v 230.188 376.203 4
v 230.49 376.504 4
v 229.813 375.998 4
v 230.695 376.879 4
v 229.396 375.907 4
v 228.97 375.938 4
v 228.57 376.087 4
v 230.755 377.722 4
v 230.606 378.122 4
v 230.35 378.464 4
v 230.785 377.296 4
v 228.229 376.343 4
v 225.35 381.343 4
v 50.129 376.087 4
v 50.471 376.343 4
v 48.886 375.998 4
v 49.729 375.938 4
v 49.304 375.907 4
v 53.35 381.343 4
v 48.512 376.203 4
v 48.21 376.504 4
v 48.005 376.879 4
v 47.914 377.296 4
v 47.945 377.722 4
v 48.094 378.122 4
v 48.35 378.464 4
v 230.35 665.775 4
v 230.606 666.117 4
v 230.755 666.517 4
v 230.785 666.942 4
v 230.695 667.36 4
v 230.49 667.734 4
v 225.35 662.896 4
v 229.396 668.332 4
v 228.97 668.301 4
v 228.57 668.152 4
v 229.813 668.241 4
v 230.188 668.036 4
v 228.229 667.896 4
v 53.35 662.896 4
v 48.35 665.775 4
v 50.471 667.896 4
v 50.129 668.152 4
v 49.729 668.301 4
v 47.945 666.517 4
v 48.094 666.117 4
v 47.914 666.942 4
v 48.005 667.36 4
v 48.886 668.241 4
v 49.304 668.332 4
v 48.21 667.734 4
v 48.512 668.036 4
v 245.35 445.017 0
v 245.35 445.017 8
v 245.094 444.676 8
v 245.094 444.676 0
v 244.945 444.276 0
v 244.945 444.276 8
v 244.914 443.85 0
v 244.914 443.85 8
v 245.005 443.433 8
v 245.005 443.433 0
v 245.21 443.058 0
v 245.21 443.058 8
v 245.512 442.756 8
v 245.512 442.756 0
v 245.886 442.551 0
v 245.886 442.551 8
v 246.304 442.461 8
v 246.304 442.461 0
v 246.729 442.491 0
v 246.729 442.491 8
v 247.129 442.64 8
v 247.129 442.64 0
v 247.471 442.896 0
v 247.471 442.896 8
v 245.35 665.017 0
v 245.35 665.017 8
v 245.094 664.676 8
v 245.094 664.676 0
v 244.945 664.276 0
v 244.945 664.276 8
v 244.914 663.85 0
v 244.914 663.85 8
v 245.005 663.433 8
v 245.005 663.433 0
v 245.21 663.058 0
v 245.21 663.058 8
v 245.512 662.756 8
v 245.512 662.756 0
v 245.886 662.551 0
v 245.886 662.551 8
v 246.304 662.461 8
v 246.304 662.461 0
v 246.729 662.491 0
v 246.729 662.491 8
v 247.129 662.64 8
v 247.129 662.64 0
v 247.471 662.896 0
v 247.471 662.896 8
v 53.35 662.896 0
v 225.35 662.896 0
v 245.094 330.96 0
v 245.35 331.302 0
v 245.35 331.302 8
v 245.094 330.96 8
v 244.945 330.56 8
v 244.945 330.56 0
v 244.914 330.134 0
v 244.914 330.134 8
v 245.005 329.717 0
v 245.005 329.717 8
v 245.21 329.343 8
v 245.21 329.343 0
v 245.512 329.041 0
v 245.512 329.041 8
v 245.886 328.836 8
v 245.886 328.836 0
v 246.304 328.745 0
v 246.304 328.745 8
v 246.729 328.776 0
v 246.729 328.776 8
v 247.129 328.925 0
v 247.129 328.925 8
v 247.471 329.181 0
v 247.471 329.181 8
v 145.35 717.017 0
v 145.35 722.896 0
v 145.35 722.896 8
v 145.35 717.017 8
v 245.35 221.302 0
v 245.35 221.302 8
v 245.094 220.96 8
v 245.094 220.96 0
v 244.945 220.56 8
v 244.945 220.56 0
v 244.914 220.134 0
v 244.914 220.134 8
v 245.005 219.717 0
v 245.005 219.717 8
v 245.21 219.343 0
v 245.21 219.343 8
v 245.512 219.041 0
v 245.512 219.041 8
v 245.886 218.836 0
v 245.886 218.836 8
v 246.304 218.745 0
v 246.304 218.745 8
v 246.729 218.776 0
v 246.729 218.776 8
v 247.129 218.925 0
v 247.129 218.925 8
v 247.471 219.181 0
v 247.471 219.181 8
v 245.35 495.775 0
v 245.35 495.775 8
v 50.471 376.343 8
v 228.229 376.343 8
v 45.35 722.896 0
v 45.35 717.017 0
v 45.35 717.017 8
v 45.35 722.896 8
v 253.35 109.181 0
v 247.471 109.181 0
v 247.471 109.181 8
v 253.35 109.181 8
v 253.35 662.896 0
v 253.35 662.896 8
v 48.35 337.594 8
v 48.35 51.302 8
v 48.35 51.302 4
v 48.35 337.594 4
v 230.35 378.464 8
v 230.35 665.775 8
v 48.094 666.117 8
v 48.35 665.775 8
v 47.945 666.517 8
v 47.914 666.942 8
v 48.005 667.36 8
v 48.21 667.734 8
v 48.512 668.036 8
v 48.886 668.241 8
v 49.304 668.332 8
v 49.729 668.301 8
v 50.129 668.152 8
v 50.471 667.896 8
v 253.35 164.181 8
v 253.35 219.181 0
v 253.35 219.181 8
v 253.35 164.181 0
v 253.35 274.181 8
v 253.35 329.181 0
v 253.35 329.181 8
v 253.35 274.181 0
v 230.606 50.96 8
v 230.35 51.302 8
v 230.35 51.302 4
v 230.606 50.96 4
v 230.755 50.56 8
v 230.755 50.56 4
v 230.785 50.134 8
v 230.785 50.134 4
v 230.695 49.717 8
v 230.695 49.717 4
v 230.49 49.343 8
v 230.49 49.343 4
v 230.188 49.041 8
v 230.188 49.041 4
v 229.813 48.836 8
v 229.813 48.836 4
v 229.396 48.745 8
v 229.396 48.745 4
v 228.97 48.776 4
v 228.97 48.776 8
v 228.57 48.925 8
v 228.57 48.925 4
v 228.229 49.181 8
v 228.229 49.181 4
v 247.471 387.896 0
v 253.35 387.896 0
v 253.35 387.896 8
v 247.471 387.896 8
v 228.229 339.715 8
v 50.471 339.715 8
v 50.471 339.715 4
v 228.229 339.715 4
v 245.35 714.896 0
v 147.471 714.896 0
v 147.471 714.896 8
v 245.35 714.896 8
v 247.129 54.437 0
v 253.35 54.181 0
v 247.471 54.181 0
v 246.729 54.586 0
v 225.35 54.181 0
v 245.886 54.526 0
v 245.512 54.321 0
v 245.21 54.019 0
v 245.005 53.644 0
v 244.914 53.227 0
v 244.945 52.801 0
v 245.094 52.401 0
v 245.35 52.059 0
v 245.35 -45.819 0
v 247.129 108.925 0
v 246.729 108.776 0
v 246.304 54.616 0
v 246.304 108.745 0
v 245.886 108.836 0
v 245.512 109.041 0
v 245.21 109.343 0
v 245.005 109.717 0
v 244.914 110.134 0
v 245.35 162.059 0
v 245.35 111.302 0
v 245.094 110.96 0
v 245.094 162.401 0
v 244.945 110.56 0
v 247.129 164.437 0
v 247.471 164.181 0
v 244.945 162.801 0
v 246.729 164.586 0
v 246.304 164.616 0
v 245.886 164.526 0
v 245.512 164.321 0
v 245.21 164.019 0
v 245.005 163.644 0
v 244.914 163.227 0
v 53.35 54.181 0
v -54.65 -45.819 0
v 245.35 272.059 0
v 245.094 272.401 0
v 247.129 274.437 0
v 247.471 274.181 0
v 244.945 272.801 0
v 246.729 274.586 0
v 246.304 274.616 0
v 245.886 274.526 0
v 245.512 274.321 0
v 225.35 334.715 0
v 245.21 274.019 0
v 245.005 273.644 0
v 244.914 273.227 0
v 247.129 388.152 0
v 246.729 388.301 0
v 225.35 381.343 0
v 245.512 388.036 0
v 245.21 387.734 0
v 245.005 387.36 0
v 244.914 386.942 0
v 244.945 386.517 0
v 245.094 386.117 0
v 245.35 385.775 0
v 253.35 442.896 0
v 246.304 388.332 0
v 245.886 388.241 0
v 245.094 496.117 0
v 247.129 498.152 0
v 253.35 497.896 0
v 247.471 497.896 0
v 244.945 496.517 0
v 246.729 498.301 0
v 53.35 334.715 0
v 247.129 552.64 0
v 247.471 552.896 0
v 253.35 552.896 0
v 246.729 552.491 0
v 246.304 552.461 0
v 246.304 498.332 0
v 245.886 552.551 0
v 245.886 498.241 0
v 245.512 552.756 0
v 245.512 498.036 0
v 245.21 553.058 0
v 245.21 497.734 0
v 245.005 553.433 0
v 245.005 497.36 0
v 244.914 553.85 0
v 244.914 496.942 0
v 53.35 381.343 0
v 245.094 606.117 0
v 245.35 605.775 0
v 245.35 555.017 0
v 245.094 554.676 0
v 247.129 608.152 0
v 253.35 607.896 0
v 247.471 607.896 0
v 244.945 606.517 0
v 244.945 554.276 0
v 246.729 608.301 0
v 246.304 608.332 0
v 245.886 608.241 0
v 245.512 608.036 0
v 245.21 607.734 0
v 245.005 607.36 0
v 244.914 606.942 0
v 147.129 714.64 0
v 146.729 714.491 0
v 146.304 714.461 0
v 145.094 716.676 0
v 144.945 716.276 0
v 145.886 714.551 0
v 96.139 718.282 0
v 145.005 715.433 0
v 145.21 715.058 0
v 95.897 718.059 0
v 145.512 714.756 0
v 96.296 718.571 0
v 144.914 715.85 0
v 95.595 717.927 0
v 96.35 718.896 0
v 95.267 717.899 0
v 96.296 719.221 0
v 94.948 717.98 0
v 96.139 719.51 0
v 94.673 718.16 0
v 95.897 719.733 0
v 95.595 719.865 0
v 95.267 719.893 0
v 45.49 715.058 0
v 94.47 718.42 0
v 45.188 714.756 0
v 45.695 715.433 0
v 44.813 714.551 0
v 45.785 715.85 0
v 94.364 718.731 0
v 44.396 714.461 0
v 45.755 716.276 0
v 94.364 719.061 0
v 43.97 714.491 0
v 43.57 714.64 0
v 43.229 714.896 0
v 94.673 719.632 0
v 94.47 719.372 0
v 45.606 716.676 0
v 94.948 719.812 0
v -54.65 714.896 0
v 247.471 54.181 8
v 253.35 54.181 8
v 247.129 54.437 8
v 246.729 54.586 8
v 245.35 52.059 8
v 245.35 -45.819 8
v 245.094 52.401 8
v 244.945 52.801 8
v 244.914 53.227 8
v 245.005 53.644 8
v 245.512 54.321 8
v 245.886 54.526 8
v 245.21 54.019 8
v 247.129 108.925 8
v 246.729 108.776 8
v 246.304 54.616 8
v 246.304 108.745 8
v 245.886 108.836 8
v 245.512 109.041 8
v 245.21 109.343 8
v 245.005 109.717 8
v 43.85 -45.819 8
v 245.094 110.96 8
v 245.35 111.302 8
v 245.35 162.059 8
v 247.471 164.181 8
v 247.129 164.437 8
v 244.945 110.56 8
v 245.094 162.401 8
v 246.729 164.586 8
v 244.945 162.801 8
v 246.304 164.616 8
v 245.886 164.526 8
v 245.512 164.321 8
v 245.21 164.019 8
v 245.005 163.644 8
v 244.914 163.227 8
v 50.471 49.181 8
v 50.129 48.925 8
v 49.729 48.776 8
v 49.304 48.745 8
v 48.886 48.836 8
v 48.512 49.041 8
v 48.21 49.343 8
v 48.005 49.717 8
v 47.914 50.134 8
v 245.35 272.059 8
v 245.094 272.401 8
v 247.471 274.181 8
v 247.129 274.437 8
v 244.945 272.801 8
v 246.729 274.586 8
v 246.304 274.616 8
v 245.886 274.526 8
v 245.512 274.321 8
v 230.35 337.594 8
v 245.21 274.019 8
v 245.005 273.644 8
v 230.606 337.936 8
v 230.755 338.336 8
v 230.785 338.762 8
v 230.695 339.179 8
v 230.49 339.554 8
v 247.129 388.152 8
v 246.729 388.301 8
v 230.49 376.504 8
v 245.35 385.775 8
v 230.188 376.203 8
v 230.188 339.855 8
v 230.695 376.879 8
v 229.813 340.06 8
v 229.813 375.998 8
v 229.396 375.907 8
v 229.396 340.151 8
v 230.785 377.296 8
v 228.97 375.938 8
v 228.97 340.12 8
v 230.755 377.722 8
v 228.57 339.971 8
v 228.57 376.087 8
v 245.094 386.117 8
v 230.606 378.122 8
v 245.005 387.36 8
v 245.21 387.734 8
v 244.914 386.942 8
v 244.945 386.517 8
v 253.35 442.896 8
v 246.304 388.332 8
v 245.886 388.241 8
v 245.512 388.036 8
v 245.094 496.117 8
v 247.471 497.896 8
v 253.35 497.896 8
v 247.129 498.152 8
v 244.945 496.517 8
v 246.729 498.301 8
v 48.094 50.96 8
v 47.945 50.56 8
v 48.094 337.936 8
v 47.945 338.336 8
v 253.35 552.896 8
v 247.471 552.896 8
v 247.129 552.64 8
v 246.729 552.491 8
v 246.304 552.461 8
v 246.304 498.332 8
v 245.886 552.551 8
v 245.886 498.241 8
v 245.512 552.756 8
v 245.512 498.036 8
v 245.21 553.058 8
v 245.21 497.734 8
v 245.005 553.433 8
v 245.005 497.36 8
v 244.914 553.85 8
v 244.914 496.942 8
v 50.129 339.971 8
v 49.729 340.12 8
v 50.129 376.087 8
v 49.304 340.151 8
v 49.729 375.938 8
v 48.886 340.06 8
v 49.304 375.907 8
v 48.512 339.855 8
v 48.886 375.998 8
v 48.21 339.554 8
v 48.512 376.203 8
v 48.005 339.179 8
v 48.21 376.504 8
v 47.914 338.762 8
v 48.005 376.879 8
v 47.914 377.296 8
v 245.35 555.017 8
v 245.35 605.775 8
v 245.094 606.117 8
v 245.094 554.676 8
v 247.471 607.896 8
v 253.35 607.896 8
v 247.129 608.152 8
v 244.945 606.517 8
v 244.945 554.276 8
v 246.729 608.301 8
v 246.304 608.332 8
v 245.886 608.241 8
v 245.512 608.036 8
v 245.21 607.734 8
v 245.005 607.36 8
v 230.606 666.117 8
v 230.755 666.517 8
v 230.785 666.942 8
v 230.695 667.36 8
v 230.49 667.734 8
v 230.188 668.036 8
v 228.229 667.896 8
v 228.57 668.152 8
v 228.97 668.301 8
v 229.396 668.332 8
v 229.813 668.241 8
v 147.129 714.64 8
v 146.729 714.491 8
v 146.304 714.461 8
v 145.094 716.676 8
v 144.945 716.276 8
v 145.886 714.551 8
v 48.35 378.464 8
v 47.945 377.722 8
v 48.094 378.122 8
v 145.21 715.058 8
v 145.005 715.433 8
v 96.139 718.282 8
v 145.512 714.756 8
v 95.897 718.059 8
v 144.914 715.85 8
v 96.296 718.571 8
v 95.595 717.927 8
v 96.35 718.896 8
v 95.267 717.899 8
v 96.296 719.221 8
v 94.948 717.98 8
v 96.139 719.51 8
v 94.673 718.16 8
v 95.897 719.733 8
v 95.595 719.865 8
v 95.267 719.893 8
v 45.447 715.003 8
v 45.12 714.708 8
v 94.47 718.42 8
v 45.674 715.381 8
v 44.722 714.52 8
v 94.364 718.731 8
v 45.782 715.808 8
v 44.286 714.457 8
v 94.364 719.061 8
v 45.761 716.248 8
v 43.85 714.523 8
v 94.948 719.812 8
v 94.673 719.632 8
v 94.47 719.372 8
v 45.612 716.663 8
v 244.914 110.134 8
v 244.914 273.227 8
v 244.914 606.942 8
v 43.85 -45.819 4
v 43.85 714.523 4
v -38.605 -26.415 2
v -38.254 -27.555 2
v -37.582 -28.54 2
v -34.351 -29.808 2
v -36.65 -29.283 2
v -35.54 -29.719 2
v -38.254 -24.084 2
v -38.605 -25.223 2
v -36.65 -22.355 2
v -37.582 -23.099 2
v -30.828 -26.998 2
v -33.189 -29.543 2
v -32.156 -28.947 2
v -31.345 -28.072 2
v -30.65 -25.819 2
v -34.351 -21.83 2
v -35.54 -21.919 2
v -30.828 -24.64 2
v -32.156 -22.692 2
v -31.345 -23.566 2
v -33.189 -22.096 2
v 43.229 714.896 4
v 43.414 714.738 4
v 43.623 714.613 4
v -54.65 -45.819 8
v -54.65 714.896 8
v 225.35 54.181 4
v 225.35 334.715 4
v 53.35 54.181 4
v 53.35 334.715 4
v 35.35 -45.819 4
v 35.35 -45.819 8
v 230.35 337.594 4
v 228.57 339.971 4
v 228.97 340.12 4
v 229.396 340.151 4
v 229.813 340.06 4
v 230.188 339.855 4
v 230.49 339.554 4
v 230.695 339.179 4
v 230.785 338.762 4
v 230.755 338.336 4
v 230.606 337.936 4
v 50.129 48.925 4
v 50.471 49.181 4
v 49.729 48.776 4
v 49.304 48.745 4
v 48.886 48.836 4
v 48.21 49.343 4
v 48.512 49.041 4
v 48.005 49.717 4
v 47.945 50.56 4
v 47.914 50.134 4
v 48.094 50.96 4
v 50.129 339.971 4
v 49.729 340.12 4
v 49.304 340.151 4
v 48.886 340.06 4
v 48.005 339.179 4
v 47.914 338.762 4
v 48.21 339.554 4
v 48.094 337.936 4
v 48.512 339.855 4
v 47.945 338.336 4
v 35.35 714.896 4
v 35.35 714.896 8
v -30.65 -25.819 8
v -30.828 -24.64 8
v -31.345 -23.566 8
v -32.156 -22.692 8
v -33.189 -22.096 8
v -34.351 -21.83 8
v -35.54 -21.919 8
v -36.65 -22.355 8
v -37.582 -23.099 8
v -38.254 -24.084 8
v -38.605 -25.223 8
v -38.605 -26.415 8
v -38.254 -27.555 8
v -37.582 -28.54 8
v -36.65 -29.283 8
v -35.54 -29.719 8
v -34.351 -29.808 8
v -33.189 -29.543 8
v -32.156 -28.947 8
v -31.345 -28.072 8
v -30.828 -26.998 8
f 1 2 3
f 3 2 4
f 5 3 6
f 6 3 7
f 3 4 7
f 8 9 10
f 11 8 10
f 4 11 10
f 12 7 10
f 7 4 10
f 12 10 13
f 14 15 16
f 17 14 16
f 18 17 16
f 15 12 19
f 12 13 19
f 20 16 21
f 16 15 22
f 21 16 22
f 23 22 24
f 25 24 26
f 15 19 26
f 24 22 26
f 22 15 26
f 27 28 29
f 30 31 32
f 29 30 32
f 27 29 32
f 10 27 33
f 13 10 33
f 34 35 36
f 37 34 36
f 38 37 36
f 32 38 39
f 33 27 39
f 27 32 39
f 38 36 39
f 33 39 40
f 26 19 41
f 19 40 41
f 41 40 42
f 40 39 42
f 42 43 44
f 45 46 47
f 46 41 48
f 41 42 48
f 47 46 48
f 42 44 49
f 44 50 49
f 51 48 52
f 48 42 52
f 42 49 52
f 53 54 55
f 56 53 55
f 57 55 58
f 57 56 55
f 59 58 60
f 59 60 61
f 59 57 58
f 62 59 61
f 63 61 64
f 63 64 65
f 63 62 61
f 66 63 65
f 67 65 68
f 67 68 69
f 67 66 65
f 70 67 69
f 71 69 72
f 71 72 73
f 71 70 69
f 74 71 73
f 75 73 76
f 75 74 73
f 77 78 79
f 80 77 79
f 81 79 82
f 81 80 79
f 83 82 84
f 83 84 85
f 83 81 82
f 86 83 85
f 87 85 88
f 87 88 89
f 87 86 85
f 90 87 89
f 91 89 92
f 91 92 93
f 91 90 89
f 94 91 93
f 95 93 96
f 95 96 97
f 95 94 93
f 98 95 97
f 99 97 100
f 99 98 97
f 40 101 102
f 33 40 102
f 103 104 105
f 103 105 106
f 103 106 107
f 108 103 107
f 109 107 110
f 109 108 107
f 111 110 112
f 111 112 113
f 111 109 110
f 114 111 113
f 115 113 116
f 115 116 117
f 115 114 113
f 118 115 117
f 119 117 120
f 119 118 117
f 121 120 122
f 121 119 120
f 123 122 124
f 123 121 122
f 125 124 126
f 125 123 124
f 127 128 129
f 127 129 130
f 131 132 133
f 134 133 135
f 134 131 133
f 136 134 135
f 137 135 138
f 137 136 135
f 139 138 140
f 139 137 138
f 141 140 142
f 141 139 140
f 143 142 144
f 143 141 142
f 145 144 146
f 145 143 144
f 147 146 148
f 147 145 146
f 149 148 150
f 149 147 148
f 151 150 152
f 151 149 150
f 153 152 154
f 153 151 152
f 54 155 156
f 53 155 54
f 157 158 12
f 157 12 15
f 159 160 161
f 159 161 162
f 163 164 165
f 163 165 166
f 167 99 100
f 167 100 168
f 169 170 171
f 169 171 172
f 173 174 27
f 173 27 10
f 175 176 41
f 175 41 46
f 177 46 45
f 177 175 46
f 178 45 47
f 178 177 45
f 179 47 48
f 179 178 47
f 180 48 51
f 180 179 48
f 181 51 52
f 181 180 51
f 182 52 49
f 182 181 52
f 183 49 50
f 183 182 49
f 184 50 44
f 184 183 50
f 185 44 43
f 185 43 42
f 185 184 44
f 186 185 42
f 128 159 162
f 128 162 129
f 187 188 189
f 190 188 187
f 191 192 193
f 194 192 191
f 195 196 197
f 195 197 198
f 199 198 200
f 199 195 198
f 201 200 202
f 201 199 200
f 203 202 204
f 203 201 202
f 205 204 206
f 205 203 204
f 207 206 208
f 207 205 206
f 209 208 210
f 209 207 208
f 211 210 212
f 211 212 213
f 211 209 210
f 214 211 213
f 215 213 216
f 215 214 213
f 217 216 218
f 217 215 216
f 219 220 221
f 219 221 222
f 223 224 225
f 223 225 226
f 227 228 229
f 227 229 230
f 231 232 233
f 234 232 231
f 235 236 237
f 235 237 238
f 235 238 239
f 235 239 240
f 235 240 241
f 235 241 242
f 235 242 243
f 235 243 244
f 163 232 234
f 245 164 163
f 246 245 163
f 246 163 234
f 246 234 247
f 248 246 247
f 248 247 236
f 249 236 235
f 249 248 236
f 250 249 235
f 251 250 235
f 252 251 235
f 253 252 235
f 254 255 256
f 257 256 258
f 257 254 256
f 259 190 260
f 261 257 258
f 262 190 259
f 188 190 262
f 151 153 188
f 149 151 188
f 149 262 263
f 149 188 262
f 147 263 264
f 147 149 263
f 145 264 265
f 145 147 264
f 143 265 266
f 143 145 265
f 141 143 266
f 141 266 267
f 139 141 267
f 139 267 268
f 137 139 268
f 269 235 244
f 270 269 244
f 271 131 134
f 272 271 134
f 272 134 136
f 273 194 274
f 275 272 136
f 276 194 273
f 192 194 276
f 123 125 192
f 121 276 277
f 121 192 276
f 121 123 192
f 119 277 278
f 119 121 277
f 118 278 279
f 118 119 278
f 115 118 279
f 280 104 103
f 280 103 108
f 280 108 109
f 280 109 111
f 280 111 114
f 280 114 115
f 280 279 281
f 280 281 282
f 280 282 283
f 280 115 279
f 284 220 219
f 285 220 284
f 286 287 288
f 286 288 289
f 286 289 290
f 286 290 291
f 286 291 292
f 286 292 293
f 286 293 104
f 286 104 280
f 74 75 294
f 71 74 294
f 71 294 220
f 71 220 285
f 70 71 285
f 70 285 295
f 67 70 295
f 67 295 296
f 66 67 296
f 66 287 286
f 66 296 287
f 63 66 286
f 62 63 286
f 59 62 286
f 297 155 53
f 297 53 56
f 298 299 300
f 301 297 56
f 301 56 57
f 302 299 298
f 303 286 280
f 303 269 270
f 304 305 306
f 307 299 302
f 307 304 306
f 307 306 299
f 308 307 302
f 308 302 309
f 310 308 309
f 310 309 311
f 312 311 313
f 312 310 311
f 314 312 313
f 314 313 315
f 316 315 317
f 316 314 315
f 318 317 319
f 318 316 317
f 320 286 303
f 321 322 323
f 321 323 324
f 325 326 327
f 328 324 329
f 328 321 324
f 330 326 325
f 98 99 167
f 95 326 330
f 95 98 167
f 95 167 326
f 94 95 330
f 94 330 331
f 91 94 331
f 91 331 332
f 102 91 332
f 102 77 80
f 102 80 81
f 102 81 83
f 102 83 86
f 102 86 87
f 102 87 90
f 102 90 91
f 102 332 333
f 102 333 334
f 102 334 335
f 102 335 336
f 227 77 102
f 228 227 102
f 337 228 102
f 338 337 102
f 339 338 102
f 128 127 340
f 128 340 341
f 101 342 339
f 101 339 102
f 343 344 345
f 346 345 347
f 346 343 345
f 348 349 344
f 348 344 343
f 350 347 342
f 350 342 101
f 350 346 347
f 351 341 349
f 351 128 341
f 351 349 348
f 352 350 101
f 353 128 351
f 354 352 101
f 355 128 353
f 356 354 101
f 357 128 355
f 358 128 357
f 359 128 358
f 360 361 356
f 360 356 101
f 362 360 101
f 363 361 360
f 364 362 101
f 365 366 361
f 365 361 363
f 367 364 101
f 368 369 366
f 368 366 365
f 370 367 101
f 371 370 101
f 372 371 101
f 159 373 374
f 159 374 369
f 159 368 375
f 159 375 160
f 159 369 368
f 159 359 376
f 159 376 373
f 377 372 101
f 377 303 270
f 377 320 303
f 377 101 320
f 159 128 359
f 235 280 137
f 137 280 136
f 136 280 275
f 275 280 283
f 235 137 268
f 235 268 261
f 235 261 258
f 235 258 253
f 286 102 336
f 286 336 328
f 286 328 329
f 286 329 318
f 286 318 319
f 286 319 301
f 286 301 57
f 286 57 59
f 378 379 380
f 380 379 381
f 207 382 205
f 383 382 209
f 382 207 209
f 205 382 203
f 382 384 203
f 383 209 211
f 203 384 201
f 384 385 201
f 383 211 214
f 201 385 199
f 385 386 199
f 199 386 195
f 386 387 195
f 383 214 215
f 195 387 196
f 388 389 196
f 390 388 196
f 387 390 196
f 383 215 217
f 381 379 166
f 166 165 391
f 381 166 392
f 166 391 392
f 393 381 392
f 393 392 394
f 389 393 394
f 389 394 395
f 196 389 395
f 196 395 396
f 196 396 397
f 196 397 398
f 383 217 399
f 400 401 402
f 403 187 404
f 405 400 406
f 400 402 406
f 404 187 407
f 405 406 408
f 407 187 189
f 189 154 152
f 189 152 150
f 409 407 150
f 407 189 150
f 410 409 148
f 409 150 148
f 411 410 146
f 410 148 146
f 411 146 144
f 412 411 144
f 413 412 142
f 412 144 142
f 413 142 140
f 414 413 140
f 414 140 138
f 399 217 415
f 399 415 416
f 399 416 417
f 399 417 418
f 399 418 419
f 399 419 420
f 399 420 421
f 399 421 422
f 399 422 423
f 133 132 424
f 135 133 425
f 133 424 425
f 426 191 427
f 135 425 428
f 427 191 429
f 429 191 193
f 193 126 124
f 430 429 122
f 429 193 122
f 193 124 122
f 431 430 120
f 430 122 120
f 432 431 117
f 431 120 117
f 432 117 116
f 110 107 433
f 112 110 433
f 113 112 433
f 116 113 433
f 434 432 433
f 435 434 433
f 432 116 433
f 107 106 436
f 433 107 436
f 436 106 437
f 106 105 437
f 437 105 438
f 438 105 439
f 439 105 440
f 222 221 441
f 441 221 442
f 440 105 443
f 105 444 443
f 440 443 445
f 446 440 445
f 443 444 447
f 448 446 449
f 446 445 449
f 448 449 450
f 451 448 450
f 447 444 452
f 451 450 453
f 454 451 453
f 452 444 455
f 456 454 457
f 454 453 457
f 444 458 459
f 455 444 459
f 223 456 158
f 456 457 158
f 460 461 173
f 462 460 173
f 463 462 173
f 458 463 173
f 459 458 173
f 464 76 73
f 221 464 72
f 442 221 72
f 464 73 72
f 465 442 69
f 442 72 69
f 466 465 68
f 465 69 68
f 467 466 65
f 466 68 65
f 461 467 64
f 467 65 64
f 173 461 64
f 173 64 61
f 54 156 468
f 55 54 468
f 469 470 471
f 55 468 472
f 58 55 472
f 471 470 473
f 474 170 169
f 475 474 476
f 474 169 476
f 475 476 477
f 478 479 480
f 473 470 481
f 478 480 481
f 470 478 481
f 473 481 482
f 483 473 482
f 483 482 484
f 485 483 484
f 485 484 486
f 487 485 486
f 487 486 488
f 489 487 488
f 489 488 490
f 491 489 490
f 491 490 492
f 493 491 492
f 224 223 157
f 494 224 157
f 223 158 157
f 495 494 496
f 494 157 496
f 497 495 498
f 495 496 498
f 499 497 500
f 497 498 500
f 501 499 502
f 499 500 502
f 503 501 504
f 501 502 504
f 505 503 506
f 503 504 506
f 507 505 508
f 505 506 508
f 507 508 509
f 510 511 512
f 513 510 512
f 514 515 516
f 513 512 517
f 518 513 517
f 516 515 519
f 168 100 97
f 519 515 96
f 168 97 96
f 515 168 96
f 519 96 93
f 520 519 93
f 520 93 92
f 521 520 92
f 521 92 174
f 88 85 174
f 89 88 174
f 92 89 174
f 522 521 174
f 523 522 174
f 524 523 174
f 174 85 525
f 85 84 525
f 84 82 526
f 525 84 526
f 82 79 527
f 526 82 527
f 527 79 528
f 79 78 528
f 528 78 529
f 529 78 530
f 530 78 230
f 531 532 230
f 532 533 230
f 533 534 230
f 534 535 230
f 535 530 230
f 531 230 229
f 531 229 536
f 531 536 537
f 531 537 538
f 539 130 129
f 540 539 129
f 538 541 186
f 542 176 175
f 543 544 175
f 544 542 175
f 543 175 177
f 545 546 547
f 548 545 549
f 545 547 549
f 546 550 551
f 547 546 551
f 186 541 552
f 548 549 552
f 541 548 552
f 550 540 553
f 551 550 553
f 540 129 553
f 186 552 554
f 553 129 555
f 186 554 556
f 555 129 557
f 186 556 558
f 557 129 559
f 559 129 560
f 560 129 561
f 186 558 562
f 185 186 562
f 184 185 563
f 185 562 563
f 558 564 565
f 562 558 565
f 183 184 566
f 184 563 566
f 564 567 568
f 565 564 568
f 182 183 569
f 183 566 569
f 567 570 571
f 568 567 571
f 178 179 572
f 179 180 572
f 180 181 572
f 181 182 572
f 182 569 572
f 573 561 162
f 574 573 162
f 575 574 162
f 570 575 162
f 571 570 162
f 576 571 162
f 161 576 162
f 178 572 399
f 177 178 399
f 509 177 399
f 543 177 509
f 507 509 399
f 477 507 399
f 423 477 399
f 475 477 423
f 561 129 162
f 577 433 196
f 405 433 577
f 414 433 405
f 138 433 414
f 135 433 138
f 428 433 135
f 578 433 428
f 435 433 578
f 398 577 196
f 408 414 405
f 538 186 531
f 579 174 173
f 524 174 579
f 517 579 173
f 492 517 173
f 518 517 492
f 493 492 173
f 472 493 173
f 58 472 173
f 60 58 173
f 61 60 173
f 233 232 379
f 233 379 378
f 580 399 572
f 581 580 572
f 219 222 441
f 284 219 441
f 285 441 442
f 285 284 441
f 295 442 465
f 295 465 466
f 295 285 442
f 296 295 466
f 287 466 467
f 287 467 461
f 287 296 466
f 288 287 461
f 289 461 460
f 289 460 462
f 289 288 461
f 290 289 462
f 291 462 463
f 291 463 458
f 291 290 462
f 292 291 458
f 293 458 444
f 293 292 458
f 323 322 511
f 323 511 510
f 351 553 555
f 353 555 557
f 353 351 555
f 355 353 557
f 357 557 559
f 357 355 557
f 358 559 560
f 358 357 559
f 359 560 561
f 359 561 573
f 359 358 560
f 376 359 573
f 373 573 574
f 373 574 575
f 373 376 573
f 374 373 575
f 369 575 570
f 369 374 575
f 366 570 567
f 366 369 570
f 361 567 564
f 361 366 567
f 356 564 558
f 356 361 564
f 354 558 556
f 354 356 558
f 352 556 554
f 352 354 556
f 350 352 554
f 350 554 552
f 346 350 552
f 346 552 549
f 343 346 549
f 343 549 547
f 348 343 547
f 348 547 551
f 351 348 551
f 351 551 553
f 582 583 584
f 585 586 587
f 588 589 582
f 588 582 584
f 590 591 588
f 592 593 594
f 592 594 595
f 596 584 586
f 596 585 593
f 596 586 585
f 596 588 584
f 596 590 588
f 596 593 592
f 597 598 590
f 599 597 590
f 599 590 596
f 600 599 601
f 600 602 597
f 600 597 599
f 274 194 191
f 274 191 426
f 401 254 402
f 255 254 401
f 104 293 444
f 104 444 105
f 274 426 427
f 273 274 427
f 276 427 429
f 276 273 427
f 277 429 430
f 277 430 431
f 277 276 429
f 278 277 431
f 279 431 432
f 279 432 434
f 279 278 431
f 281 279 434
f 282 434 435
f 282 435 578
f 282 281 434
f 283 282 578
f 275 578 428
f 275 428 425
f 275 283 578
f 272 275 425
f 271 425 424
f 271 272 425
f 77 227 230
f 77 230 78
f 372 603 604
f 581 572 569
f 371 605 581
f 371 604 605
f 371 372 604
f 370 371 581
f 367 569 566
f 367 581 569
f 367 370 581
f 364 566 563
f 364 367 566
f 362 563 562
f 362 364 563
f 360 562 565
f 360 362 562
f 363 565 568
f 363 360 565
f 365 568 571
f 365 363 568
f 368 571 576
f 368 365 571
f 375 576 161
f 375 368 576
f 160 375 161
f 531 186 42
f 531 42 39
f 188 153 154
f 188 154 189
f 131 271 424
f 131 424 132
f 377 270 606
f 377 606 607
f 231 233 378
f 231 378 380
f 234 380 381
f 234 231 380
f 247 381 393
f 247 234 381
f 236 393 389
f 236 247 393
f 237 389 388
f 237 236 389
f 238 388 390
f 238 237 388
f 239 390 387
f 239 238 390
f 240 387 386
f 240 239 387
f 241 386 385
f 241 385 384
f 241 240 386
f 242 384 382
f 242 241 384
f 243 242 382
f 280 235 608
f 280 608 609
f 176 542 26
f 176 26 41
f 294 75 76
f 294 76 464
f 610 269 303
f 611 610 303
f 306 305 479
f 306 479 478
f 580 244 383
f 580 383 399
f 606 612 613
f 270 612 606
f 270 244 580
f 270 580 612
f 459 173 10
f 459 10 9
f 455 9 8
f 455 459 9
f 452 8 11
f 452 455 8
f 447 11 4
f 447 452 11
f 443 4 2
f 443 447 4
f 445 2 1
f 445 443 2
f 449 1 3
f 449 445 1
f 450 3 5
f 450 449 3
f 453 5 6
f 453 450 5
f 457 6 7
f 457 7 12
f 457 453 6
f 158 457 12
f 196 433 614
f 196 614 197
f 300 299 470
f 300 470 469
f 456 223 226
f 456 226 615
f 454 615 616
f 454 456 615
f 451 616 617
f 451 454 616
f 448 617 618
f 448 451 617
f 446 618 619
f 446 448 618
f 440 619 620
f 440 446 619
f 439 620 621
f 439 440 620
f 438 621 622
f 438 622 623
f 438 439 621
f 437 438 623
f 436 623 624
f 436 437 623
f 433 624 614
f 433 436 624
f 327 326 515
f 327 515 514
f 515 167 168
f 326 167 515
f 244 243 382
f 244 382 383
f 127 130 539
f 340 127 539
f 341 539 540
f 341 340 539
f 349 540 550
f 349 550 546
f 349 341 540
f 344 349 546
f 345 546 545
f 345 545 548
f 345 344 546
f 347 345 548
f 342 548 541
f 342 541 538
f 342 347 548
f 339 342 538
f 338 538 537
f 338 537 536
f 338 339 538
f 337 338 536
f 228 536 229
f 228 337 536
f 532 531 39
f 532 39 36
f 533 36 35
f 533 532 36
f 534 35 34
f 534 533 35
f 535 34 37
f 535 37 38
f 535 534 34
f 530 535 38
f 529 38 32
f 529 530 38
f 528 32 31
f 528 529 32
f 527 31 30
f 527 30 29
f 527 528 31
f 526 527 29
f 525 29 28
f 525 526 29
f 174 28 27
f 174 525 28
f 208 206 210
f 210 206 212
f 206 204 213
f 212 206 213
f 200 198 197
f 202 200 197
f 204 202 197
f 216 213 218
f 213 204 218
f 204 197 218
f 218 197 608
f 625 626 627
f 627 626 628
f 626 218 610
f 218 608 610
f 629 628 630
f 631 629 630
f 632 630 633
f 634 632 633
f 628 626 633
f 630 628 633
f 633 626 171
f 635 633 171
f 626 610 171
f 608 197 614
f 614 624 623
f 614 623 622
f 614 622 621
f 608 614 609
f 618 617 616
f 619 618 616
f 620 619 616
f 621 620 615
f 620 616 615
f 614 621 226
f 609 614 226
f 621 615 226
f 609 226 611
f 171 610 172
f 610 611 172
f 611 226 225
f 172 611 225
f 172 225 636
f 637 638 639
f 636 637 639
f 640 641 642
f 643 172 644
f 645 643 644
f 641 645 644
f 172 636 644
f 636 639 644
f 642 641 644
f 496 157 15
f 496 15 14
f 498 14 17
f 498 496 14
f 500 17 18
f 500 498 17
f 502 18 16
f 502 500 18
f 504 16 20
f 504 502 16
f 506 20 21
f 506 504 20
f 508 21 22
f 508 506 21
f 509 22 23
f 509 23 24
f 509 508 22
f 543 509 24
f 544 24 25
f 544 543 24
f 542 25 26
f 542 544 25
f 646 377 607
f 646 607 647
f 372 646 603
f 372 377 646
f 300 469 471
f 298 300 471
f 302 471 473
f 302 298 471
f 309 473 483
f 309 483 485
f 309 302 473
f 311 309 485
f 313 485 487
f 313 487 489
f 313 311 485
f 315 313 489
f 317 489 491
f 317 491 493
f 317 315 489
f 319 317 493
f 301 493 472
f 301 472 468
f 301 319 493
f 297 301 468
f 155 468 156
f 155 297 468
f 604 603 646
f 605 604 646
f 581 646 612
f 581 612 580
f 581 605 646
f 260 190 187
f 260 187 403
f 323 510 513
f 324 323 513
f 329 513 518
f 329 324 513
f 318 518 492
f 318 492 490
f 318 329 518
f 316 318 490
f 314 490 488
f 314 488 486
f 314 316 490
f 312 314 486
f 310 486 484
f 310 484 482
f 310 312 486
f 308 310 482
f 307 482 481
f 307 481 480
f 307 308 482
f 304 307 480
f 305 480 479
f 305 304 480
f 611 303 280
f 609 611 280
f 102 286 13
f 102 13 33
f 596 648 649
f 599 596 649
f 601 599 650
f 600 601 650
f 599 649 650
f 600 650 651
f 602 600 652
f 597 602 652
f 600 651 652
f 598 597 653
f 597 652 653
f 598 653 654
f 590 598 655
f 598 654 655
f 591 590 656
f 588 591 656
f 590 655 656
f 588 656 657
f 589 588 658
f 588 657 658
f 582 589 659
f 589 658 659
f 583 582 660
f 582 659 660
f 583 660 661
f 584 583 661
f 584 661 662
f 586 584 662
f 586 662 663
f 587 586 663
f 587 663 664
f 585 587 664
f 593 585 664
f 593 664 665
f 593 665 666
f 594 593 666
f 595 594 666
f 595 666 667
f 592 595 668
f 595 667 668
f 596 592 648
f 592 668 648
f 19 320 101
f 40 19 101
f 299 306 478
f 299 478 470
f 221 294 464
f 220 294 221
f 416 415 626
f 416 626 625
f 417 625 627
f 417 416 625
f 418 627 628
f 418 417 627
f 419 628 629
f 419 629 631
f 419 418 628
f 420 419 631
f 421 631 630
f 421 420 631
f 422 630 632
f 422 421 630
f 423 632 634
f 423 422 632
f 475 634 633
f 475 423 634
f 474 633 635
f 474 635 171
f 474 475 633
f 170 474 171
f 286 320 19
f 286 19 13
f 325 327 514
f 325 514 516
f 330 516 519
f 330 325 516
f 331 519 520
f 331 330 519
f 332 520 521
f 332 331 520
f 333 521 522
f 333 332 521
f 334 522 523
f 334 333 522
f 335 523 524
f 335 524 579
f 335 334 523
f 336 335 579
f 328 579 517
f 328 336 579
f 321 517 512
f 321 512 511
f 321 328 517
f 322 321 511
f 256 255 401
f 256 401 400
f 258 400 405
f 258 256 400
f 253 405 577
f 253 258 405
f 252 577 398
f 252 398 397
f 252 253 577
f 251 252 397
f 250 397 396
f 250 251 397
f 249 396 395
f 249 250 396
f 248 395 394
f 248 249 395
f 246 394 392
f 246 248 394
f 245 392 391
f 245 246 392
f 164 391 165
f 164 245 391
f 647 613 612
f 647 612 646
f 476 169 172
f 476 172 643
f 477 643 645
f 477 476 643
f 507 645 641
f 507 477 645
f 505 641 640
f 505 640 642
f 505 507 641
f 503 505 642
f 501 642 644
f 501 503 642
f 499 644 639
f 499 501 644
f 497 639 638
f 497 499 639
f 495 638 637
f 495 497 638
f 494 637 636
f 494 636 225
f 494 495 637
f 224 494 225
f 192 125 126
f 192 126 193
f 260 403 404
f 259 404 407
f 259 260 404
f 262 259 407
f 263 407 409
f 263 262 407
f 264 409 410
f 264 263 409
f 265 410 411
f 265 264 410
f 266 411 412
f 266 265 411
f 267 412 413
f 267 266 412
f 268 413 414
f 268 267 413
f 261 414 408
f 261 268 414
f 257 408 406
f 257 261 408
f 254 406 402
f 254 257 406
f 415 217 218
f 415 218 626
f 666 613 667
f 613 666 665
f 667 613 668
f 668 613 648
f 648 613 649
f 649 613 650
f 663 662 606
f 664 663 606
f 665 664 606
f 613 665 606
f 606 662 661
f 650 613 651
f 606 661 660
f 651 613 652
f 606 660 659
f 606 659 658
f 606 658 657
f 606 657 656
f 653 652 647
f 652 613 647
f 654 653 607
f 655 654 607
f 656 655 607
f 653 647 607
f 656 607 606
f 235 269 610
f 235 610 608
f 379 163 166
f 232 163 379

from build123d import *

# Parameters (mm, degrees)
ESQUISSE1_R             = 1
ESQUISSE1_W             = 172
ESQUISSE1_H             = 281.553390594
ESQUISSE1_H_2           = 280.534461641
BOSS_EXTRU_1_DEPTH      = 8
ENL_V_MAT_EXTRU_1_DEPTH = 4
ESQUISSE3_W             = 8.5
ESQUISSE3_H             = 760.715269233
ENL_V_MAT_EXTRU_2_DEPTH = 4
ESQUISSE4_R             = 4
ENL_V_MAT_EXTRU_3_DEPTH = 6


with BuildPart() as part:
    # Esquisse1 → Boss.-Extru.1 (new body)
    with BuildSketch(Plane.XY):
        with BuildLine():
            Line((-54.650090097, -45.819197646), (-54.650090097, 358.028972494))
            Line((-54.650090097, 358.028972494), (-54.650090097, 714.896071587))
            Line((-54.650090097, 714.896071587), (43.228589559, 714.896071587))
            ThreePointArc((43.228589559, 714.896071587), (45.349909903, 714.896071587), (45.349909903, 717.01739193))
            Line((45.349909903, 717.01739193), (45.349909903, 722.896071587))
            Line((45.349909903, 722.896071587), (145.349909903, 722.896071587))
            Line((145.349909903, 722.896071587), (145.349909903, 717.01739193))
            ThreePointArc((145.349909903, 717.01739193), (145.349909903, 714.896071587), (147.471230246, 714.896071587))
            Line((147.471230246, 714.896071587), (245.349909903, 714.896071587))
            Line((245.349909903, 714.896071587), (245.349909903, 665.01739193))
            ThreePointArc((245.349909903, 665.01739193), (245.349909903, 662.896071587), (247.471230246, 662.896071587))
            Line((247.471230246, 662.896071587), (253.349909903, 662.896071587))
            Line((253.349909903, 662.896071587), (253.349909903, 607.896071587))
            Line((253.349909903, 607.896071587), (247.471230246, 607.896071587))
            ThreePointArc((247.471230246, 607.896071587), (245.349909903, 607.896071587), (245.349909903, 605.774751243))
            Line((245.349909903, 605.774751243), (245.349909903, 555.01739193))
            ThreePointArc((245.349909903, 555.01739193), (245.349909903, 552.896071587), (247.471230246, 552.896071587))
            Line((247.471230246, 552.896071587), (253.349909903, 552.896071587))
            Line((253.349909903, 552.896071587), (253.349909903, 497.896071587))
            Line((253.349909903, 497.896071587), (247.471230246, 497.896071587))
            ThreePointArc((247.471230246, 497.896071587), (245.349909903, 497.896071587), (245.349909903, 495.774751243))
            Line((245.349909903, 495.774751243), (245.349909903, 445.01739193))
            ThreePointArc((245.349909903, 445.01739193), (245.349909903, 442.896071587), (247.471230246, 442.896071587))
            Line((247.471230246, 442.896071587), (253.349909903, 442.896071587))
            Line((253.349909903, 442.896071587), (253.349909903, 387.896071587))
            Line((253.349909903, 387.896071587), (247.471230246, 387.896071587))
            ThreePointArc((247.471230246, 387.896071587), (245.349909903, 387.896071587), (245.349909903, 385.774751243))
            Line((245.349909903, 385.774751243), (245.349909903, 331.302122698))
            ThreePointArc((245.349909903, 331.302122698), (245.349909903, 329.180802354), (247.471230246, 329.180802354))
            Line((247.471230246, 329.180802354), (253.349909903, 329.180802354))
            Line((253.349909903, 329.180802354), (253.349909903, 274.180802354))
            Line((253.349909903, 274.180802354), (247.471230246, 274.180802354))
            ThreePointArc((247.471230246, 274.180802354), (245.349909903, 274.180802354), (245.349909903, 272.059482011))
            Line((245.349909903, 272.059482011), (245.349909903, 221.302122698))
            ThreePointArc((245.349909903, 221.302122698), (245.349909903, 219.180802354), (247.471230246, 219.180802354))
            Line((247.471230246, 219.180802354), (253.349909903, 219.180802354))
            Line((253.349909903, 219.180802354), (253.349909903, 164.180802354))
            Line((253.349909903, 164.180802354), (247.471230246, 164.180802354))
            ThreePointArc((247.471230246, 164.180802354), (245.349909903, 164.180802354), (245.349909903, 162.059482011))
            Line((245.349909903, 162.059482011), (245.349909903, 111.302122698))
            ThreePointArc((245.349909903, 111.302122698), (245.349909903, 109.180802354), (247.471230246, 109.180802354))
            Line((247.471230246, 109.180802354), (253.349909903, 109.180802354))
            Line((253.349909903, 109.180802354), (253.349909903, 54.180802354))
            Line((253.349909903, 54.180802354), (247.471230246, 54.180802354))
            ThreePointArc((247.471230246, 54.180802354), (245.349909903, 54.180802354), (245.349909903, 52.059482011))
            Line((245.349909903, 52.059482011), (245.349909903, -45.819197646))
            Line((245.349909903, -45.819197646), (-54.650090097, -45.819197646))
        make_face()
        with Locations((95.349909903, 718.896071587)):
            Circle(ESQUISSE1_R, mode=Mode.SUBTRACT)
        with Locations((139.349909903, 522.11937629)):
            Rectangle(ESQUISSE1_W, ESQUISSE1_H, mode=Mode.SUBTRACT)
        with Locations((139.349909903, 194.448033175)):
            Rectangle(ESQUISSE1_W, ESQUISSE1_H_2, mode=Mode.SUBTRACT)
    extrude(amount=BOSS_EXTRU_1_DEPTH)

    # Esquisse2 → Enlèv. mat.-Extru.1 (cut)
    with BuildSketch(Plane.XY.offset(8)):
        with BuildLine():
            Line((50.471230246, 339.715263995), (228.228589559, 339.715263995))
            ThreePointArc((228.228589559, 339.715263995), (230.349909903, 339.715263995), (230.349909903, 337.593943652))
            Line((230.349909903, 337.593943652), (230.349909903, 51.302122698))
            ThreePointArc((230.349909903, 51.302122698), (230.349909903, 49.180802354), (228.228589559, 49.180802354))
            Line((228.228589559, 49.180802354), (50.471230246, 49.180802354))
            ThreePointArc((50.471230246, 49.180802354), (48.349909903, 49.180802354), (48.349909903, 51.302122698))
            Line((48.349909903, 51.302122698), (48.349909903, 337.593943652))
            ThreePointArc((48.349909903, 337.593943652), (48.349909903, 339.715263995), (50.471230246, 339.715263995))
        make_face()
        with BuildLine():
            Line((50.471230246, 667.896071587), (228.228589559, 667.896071587))
            ThreePointArc((228.228589559, 667.896071587), (230.349909903, 667.896071587), (230.349909903, 665.774751243))
            Line((230.349909903, 665.774751243), (230.349909903, 378.464001337))
            ThreePointArc((230.349909903, 378.464001337), (230.349909903, 376.342680993), (228.228589559, 376.342680993))
            Line((228.228589559, 376.342680993), (50.471230246, 376.342680993))
            ThreePointArc((50.471230246, 376.342680993), (48.349909903, 376.342680993), (48.349909903, 378.464001337))
            Line((48.349909903, 378.464001337), (48.349909903, 665.774751243))
            ThreePointArc((48.349909903, 665.774751243), (48.349909903, 667.896071587), (50.471230246, 667.896071587))
        make_face()
    extrude(amount=-ENL_V_MAT_EXTRU_1_DEPTH, mode=Mode.SUBTRACT)

    # Esquisse3 → Enlèv. mat.-Extru.2 (cut)
    with BuildSketch(Plane.XY.offset(8)):
        with Locations((39.599909903, 334.538436971)):
            Rectangle(ESQUISSE3_W, ESQUISSE3_H)
    extrude(amount=-ENL_V_MAT_EXTRU_2_DEPTH, mode=Mode.SUBTRACT)

    # Esquisse4 → Enlèv. mat.-Extru.3 (cut)
    with BuildSketch(Plane.XY.offset(8)):
        with Locations((-34.650090097, -25.819197646)):
            Circle(ESQUISSE4_R)
    extrude(amount=-ENL_V_MAT_EXTRU_3_DEPTH, mode=Mode.SUBTRACT)


solid = part.part
